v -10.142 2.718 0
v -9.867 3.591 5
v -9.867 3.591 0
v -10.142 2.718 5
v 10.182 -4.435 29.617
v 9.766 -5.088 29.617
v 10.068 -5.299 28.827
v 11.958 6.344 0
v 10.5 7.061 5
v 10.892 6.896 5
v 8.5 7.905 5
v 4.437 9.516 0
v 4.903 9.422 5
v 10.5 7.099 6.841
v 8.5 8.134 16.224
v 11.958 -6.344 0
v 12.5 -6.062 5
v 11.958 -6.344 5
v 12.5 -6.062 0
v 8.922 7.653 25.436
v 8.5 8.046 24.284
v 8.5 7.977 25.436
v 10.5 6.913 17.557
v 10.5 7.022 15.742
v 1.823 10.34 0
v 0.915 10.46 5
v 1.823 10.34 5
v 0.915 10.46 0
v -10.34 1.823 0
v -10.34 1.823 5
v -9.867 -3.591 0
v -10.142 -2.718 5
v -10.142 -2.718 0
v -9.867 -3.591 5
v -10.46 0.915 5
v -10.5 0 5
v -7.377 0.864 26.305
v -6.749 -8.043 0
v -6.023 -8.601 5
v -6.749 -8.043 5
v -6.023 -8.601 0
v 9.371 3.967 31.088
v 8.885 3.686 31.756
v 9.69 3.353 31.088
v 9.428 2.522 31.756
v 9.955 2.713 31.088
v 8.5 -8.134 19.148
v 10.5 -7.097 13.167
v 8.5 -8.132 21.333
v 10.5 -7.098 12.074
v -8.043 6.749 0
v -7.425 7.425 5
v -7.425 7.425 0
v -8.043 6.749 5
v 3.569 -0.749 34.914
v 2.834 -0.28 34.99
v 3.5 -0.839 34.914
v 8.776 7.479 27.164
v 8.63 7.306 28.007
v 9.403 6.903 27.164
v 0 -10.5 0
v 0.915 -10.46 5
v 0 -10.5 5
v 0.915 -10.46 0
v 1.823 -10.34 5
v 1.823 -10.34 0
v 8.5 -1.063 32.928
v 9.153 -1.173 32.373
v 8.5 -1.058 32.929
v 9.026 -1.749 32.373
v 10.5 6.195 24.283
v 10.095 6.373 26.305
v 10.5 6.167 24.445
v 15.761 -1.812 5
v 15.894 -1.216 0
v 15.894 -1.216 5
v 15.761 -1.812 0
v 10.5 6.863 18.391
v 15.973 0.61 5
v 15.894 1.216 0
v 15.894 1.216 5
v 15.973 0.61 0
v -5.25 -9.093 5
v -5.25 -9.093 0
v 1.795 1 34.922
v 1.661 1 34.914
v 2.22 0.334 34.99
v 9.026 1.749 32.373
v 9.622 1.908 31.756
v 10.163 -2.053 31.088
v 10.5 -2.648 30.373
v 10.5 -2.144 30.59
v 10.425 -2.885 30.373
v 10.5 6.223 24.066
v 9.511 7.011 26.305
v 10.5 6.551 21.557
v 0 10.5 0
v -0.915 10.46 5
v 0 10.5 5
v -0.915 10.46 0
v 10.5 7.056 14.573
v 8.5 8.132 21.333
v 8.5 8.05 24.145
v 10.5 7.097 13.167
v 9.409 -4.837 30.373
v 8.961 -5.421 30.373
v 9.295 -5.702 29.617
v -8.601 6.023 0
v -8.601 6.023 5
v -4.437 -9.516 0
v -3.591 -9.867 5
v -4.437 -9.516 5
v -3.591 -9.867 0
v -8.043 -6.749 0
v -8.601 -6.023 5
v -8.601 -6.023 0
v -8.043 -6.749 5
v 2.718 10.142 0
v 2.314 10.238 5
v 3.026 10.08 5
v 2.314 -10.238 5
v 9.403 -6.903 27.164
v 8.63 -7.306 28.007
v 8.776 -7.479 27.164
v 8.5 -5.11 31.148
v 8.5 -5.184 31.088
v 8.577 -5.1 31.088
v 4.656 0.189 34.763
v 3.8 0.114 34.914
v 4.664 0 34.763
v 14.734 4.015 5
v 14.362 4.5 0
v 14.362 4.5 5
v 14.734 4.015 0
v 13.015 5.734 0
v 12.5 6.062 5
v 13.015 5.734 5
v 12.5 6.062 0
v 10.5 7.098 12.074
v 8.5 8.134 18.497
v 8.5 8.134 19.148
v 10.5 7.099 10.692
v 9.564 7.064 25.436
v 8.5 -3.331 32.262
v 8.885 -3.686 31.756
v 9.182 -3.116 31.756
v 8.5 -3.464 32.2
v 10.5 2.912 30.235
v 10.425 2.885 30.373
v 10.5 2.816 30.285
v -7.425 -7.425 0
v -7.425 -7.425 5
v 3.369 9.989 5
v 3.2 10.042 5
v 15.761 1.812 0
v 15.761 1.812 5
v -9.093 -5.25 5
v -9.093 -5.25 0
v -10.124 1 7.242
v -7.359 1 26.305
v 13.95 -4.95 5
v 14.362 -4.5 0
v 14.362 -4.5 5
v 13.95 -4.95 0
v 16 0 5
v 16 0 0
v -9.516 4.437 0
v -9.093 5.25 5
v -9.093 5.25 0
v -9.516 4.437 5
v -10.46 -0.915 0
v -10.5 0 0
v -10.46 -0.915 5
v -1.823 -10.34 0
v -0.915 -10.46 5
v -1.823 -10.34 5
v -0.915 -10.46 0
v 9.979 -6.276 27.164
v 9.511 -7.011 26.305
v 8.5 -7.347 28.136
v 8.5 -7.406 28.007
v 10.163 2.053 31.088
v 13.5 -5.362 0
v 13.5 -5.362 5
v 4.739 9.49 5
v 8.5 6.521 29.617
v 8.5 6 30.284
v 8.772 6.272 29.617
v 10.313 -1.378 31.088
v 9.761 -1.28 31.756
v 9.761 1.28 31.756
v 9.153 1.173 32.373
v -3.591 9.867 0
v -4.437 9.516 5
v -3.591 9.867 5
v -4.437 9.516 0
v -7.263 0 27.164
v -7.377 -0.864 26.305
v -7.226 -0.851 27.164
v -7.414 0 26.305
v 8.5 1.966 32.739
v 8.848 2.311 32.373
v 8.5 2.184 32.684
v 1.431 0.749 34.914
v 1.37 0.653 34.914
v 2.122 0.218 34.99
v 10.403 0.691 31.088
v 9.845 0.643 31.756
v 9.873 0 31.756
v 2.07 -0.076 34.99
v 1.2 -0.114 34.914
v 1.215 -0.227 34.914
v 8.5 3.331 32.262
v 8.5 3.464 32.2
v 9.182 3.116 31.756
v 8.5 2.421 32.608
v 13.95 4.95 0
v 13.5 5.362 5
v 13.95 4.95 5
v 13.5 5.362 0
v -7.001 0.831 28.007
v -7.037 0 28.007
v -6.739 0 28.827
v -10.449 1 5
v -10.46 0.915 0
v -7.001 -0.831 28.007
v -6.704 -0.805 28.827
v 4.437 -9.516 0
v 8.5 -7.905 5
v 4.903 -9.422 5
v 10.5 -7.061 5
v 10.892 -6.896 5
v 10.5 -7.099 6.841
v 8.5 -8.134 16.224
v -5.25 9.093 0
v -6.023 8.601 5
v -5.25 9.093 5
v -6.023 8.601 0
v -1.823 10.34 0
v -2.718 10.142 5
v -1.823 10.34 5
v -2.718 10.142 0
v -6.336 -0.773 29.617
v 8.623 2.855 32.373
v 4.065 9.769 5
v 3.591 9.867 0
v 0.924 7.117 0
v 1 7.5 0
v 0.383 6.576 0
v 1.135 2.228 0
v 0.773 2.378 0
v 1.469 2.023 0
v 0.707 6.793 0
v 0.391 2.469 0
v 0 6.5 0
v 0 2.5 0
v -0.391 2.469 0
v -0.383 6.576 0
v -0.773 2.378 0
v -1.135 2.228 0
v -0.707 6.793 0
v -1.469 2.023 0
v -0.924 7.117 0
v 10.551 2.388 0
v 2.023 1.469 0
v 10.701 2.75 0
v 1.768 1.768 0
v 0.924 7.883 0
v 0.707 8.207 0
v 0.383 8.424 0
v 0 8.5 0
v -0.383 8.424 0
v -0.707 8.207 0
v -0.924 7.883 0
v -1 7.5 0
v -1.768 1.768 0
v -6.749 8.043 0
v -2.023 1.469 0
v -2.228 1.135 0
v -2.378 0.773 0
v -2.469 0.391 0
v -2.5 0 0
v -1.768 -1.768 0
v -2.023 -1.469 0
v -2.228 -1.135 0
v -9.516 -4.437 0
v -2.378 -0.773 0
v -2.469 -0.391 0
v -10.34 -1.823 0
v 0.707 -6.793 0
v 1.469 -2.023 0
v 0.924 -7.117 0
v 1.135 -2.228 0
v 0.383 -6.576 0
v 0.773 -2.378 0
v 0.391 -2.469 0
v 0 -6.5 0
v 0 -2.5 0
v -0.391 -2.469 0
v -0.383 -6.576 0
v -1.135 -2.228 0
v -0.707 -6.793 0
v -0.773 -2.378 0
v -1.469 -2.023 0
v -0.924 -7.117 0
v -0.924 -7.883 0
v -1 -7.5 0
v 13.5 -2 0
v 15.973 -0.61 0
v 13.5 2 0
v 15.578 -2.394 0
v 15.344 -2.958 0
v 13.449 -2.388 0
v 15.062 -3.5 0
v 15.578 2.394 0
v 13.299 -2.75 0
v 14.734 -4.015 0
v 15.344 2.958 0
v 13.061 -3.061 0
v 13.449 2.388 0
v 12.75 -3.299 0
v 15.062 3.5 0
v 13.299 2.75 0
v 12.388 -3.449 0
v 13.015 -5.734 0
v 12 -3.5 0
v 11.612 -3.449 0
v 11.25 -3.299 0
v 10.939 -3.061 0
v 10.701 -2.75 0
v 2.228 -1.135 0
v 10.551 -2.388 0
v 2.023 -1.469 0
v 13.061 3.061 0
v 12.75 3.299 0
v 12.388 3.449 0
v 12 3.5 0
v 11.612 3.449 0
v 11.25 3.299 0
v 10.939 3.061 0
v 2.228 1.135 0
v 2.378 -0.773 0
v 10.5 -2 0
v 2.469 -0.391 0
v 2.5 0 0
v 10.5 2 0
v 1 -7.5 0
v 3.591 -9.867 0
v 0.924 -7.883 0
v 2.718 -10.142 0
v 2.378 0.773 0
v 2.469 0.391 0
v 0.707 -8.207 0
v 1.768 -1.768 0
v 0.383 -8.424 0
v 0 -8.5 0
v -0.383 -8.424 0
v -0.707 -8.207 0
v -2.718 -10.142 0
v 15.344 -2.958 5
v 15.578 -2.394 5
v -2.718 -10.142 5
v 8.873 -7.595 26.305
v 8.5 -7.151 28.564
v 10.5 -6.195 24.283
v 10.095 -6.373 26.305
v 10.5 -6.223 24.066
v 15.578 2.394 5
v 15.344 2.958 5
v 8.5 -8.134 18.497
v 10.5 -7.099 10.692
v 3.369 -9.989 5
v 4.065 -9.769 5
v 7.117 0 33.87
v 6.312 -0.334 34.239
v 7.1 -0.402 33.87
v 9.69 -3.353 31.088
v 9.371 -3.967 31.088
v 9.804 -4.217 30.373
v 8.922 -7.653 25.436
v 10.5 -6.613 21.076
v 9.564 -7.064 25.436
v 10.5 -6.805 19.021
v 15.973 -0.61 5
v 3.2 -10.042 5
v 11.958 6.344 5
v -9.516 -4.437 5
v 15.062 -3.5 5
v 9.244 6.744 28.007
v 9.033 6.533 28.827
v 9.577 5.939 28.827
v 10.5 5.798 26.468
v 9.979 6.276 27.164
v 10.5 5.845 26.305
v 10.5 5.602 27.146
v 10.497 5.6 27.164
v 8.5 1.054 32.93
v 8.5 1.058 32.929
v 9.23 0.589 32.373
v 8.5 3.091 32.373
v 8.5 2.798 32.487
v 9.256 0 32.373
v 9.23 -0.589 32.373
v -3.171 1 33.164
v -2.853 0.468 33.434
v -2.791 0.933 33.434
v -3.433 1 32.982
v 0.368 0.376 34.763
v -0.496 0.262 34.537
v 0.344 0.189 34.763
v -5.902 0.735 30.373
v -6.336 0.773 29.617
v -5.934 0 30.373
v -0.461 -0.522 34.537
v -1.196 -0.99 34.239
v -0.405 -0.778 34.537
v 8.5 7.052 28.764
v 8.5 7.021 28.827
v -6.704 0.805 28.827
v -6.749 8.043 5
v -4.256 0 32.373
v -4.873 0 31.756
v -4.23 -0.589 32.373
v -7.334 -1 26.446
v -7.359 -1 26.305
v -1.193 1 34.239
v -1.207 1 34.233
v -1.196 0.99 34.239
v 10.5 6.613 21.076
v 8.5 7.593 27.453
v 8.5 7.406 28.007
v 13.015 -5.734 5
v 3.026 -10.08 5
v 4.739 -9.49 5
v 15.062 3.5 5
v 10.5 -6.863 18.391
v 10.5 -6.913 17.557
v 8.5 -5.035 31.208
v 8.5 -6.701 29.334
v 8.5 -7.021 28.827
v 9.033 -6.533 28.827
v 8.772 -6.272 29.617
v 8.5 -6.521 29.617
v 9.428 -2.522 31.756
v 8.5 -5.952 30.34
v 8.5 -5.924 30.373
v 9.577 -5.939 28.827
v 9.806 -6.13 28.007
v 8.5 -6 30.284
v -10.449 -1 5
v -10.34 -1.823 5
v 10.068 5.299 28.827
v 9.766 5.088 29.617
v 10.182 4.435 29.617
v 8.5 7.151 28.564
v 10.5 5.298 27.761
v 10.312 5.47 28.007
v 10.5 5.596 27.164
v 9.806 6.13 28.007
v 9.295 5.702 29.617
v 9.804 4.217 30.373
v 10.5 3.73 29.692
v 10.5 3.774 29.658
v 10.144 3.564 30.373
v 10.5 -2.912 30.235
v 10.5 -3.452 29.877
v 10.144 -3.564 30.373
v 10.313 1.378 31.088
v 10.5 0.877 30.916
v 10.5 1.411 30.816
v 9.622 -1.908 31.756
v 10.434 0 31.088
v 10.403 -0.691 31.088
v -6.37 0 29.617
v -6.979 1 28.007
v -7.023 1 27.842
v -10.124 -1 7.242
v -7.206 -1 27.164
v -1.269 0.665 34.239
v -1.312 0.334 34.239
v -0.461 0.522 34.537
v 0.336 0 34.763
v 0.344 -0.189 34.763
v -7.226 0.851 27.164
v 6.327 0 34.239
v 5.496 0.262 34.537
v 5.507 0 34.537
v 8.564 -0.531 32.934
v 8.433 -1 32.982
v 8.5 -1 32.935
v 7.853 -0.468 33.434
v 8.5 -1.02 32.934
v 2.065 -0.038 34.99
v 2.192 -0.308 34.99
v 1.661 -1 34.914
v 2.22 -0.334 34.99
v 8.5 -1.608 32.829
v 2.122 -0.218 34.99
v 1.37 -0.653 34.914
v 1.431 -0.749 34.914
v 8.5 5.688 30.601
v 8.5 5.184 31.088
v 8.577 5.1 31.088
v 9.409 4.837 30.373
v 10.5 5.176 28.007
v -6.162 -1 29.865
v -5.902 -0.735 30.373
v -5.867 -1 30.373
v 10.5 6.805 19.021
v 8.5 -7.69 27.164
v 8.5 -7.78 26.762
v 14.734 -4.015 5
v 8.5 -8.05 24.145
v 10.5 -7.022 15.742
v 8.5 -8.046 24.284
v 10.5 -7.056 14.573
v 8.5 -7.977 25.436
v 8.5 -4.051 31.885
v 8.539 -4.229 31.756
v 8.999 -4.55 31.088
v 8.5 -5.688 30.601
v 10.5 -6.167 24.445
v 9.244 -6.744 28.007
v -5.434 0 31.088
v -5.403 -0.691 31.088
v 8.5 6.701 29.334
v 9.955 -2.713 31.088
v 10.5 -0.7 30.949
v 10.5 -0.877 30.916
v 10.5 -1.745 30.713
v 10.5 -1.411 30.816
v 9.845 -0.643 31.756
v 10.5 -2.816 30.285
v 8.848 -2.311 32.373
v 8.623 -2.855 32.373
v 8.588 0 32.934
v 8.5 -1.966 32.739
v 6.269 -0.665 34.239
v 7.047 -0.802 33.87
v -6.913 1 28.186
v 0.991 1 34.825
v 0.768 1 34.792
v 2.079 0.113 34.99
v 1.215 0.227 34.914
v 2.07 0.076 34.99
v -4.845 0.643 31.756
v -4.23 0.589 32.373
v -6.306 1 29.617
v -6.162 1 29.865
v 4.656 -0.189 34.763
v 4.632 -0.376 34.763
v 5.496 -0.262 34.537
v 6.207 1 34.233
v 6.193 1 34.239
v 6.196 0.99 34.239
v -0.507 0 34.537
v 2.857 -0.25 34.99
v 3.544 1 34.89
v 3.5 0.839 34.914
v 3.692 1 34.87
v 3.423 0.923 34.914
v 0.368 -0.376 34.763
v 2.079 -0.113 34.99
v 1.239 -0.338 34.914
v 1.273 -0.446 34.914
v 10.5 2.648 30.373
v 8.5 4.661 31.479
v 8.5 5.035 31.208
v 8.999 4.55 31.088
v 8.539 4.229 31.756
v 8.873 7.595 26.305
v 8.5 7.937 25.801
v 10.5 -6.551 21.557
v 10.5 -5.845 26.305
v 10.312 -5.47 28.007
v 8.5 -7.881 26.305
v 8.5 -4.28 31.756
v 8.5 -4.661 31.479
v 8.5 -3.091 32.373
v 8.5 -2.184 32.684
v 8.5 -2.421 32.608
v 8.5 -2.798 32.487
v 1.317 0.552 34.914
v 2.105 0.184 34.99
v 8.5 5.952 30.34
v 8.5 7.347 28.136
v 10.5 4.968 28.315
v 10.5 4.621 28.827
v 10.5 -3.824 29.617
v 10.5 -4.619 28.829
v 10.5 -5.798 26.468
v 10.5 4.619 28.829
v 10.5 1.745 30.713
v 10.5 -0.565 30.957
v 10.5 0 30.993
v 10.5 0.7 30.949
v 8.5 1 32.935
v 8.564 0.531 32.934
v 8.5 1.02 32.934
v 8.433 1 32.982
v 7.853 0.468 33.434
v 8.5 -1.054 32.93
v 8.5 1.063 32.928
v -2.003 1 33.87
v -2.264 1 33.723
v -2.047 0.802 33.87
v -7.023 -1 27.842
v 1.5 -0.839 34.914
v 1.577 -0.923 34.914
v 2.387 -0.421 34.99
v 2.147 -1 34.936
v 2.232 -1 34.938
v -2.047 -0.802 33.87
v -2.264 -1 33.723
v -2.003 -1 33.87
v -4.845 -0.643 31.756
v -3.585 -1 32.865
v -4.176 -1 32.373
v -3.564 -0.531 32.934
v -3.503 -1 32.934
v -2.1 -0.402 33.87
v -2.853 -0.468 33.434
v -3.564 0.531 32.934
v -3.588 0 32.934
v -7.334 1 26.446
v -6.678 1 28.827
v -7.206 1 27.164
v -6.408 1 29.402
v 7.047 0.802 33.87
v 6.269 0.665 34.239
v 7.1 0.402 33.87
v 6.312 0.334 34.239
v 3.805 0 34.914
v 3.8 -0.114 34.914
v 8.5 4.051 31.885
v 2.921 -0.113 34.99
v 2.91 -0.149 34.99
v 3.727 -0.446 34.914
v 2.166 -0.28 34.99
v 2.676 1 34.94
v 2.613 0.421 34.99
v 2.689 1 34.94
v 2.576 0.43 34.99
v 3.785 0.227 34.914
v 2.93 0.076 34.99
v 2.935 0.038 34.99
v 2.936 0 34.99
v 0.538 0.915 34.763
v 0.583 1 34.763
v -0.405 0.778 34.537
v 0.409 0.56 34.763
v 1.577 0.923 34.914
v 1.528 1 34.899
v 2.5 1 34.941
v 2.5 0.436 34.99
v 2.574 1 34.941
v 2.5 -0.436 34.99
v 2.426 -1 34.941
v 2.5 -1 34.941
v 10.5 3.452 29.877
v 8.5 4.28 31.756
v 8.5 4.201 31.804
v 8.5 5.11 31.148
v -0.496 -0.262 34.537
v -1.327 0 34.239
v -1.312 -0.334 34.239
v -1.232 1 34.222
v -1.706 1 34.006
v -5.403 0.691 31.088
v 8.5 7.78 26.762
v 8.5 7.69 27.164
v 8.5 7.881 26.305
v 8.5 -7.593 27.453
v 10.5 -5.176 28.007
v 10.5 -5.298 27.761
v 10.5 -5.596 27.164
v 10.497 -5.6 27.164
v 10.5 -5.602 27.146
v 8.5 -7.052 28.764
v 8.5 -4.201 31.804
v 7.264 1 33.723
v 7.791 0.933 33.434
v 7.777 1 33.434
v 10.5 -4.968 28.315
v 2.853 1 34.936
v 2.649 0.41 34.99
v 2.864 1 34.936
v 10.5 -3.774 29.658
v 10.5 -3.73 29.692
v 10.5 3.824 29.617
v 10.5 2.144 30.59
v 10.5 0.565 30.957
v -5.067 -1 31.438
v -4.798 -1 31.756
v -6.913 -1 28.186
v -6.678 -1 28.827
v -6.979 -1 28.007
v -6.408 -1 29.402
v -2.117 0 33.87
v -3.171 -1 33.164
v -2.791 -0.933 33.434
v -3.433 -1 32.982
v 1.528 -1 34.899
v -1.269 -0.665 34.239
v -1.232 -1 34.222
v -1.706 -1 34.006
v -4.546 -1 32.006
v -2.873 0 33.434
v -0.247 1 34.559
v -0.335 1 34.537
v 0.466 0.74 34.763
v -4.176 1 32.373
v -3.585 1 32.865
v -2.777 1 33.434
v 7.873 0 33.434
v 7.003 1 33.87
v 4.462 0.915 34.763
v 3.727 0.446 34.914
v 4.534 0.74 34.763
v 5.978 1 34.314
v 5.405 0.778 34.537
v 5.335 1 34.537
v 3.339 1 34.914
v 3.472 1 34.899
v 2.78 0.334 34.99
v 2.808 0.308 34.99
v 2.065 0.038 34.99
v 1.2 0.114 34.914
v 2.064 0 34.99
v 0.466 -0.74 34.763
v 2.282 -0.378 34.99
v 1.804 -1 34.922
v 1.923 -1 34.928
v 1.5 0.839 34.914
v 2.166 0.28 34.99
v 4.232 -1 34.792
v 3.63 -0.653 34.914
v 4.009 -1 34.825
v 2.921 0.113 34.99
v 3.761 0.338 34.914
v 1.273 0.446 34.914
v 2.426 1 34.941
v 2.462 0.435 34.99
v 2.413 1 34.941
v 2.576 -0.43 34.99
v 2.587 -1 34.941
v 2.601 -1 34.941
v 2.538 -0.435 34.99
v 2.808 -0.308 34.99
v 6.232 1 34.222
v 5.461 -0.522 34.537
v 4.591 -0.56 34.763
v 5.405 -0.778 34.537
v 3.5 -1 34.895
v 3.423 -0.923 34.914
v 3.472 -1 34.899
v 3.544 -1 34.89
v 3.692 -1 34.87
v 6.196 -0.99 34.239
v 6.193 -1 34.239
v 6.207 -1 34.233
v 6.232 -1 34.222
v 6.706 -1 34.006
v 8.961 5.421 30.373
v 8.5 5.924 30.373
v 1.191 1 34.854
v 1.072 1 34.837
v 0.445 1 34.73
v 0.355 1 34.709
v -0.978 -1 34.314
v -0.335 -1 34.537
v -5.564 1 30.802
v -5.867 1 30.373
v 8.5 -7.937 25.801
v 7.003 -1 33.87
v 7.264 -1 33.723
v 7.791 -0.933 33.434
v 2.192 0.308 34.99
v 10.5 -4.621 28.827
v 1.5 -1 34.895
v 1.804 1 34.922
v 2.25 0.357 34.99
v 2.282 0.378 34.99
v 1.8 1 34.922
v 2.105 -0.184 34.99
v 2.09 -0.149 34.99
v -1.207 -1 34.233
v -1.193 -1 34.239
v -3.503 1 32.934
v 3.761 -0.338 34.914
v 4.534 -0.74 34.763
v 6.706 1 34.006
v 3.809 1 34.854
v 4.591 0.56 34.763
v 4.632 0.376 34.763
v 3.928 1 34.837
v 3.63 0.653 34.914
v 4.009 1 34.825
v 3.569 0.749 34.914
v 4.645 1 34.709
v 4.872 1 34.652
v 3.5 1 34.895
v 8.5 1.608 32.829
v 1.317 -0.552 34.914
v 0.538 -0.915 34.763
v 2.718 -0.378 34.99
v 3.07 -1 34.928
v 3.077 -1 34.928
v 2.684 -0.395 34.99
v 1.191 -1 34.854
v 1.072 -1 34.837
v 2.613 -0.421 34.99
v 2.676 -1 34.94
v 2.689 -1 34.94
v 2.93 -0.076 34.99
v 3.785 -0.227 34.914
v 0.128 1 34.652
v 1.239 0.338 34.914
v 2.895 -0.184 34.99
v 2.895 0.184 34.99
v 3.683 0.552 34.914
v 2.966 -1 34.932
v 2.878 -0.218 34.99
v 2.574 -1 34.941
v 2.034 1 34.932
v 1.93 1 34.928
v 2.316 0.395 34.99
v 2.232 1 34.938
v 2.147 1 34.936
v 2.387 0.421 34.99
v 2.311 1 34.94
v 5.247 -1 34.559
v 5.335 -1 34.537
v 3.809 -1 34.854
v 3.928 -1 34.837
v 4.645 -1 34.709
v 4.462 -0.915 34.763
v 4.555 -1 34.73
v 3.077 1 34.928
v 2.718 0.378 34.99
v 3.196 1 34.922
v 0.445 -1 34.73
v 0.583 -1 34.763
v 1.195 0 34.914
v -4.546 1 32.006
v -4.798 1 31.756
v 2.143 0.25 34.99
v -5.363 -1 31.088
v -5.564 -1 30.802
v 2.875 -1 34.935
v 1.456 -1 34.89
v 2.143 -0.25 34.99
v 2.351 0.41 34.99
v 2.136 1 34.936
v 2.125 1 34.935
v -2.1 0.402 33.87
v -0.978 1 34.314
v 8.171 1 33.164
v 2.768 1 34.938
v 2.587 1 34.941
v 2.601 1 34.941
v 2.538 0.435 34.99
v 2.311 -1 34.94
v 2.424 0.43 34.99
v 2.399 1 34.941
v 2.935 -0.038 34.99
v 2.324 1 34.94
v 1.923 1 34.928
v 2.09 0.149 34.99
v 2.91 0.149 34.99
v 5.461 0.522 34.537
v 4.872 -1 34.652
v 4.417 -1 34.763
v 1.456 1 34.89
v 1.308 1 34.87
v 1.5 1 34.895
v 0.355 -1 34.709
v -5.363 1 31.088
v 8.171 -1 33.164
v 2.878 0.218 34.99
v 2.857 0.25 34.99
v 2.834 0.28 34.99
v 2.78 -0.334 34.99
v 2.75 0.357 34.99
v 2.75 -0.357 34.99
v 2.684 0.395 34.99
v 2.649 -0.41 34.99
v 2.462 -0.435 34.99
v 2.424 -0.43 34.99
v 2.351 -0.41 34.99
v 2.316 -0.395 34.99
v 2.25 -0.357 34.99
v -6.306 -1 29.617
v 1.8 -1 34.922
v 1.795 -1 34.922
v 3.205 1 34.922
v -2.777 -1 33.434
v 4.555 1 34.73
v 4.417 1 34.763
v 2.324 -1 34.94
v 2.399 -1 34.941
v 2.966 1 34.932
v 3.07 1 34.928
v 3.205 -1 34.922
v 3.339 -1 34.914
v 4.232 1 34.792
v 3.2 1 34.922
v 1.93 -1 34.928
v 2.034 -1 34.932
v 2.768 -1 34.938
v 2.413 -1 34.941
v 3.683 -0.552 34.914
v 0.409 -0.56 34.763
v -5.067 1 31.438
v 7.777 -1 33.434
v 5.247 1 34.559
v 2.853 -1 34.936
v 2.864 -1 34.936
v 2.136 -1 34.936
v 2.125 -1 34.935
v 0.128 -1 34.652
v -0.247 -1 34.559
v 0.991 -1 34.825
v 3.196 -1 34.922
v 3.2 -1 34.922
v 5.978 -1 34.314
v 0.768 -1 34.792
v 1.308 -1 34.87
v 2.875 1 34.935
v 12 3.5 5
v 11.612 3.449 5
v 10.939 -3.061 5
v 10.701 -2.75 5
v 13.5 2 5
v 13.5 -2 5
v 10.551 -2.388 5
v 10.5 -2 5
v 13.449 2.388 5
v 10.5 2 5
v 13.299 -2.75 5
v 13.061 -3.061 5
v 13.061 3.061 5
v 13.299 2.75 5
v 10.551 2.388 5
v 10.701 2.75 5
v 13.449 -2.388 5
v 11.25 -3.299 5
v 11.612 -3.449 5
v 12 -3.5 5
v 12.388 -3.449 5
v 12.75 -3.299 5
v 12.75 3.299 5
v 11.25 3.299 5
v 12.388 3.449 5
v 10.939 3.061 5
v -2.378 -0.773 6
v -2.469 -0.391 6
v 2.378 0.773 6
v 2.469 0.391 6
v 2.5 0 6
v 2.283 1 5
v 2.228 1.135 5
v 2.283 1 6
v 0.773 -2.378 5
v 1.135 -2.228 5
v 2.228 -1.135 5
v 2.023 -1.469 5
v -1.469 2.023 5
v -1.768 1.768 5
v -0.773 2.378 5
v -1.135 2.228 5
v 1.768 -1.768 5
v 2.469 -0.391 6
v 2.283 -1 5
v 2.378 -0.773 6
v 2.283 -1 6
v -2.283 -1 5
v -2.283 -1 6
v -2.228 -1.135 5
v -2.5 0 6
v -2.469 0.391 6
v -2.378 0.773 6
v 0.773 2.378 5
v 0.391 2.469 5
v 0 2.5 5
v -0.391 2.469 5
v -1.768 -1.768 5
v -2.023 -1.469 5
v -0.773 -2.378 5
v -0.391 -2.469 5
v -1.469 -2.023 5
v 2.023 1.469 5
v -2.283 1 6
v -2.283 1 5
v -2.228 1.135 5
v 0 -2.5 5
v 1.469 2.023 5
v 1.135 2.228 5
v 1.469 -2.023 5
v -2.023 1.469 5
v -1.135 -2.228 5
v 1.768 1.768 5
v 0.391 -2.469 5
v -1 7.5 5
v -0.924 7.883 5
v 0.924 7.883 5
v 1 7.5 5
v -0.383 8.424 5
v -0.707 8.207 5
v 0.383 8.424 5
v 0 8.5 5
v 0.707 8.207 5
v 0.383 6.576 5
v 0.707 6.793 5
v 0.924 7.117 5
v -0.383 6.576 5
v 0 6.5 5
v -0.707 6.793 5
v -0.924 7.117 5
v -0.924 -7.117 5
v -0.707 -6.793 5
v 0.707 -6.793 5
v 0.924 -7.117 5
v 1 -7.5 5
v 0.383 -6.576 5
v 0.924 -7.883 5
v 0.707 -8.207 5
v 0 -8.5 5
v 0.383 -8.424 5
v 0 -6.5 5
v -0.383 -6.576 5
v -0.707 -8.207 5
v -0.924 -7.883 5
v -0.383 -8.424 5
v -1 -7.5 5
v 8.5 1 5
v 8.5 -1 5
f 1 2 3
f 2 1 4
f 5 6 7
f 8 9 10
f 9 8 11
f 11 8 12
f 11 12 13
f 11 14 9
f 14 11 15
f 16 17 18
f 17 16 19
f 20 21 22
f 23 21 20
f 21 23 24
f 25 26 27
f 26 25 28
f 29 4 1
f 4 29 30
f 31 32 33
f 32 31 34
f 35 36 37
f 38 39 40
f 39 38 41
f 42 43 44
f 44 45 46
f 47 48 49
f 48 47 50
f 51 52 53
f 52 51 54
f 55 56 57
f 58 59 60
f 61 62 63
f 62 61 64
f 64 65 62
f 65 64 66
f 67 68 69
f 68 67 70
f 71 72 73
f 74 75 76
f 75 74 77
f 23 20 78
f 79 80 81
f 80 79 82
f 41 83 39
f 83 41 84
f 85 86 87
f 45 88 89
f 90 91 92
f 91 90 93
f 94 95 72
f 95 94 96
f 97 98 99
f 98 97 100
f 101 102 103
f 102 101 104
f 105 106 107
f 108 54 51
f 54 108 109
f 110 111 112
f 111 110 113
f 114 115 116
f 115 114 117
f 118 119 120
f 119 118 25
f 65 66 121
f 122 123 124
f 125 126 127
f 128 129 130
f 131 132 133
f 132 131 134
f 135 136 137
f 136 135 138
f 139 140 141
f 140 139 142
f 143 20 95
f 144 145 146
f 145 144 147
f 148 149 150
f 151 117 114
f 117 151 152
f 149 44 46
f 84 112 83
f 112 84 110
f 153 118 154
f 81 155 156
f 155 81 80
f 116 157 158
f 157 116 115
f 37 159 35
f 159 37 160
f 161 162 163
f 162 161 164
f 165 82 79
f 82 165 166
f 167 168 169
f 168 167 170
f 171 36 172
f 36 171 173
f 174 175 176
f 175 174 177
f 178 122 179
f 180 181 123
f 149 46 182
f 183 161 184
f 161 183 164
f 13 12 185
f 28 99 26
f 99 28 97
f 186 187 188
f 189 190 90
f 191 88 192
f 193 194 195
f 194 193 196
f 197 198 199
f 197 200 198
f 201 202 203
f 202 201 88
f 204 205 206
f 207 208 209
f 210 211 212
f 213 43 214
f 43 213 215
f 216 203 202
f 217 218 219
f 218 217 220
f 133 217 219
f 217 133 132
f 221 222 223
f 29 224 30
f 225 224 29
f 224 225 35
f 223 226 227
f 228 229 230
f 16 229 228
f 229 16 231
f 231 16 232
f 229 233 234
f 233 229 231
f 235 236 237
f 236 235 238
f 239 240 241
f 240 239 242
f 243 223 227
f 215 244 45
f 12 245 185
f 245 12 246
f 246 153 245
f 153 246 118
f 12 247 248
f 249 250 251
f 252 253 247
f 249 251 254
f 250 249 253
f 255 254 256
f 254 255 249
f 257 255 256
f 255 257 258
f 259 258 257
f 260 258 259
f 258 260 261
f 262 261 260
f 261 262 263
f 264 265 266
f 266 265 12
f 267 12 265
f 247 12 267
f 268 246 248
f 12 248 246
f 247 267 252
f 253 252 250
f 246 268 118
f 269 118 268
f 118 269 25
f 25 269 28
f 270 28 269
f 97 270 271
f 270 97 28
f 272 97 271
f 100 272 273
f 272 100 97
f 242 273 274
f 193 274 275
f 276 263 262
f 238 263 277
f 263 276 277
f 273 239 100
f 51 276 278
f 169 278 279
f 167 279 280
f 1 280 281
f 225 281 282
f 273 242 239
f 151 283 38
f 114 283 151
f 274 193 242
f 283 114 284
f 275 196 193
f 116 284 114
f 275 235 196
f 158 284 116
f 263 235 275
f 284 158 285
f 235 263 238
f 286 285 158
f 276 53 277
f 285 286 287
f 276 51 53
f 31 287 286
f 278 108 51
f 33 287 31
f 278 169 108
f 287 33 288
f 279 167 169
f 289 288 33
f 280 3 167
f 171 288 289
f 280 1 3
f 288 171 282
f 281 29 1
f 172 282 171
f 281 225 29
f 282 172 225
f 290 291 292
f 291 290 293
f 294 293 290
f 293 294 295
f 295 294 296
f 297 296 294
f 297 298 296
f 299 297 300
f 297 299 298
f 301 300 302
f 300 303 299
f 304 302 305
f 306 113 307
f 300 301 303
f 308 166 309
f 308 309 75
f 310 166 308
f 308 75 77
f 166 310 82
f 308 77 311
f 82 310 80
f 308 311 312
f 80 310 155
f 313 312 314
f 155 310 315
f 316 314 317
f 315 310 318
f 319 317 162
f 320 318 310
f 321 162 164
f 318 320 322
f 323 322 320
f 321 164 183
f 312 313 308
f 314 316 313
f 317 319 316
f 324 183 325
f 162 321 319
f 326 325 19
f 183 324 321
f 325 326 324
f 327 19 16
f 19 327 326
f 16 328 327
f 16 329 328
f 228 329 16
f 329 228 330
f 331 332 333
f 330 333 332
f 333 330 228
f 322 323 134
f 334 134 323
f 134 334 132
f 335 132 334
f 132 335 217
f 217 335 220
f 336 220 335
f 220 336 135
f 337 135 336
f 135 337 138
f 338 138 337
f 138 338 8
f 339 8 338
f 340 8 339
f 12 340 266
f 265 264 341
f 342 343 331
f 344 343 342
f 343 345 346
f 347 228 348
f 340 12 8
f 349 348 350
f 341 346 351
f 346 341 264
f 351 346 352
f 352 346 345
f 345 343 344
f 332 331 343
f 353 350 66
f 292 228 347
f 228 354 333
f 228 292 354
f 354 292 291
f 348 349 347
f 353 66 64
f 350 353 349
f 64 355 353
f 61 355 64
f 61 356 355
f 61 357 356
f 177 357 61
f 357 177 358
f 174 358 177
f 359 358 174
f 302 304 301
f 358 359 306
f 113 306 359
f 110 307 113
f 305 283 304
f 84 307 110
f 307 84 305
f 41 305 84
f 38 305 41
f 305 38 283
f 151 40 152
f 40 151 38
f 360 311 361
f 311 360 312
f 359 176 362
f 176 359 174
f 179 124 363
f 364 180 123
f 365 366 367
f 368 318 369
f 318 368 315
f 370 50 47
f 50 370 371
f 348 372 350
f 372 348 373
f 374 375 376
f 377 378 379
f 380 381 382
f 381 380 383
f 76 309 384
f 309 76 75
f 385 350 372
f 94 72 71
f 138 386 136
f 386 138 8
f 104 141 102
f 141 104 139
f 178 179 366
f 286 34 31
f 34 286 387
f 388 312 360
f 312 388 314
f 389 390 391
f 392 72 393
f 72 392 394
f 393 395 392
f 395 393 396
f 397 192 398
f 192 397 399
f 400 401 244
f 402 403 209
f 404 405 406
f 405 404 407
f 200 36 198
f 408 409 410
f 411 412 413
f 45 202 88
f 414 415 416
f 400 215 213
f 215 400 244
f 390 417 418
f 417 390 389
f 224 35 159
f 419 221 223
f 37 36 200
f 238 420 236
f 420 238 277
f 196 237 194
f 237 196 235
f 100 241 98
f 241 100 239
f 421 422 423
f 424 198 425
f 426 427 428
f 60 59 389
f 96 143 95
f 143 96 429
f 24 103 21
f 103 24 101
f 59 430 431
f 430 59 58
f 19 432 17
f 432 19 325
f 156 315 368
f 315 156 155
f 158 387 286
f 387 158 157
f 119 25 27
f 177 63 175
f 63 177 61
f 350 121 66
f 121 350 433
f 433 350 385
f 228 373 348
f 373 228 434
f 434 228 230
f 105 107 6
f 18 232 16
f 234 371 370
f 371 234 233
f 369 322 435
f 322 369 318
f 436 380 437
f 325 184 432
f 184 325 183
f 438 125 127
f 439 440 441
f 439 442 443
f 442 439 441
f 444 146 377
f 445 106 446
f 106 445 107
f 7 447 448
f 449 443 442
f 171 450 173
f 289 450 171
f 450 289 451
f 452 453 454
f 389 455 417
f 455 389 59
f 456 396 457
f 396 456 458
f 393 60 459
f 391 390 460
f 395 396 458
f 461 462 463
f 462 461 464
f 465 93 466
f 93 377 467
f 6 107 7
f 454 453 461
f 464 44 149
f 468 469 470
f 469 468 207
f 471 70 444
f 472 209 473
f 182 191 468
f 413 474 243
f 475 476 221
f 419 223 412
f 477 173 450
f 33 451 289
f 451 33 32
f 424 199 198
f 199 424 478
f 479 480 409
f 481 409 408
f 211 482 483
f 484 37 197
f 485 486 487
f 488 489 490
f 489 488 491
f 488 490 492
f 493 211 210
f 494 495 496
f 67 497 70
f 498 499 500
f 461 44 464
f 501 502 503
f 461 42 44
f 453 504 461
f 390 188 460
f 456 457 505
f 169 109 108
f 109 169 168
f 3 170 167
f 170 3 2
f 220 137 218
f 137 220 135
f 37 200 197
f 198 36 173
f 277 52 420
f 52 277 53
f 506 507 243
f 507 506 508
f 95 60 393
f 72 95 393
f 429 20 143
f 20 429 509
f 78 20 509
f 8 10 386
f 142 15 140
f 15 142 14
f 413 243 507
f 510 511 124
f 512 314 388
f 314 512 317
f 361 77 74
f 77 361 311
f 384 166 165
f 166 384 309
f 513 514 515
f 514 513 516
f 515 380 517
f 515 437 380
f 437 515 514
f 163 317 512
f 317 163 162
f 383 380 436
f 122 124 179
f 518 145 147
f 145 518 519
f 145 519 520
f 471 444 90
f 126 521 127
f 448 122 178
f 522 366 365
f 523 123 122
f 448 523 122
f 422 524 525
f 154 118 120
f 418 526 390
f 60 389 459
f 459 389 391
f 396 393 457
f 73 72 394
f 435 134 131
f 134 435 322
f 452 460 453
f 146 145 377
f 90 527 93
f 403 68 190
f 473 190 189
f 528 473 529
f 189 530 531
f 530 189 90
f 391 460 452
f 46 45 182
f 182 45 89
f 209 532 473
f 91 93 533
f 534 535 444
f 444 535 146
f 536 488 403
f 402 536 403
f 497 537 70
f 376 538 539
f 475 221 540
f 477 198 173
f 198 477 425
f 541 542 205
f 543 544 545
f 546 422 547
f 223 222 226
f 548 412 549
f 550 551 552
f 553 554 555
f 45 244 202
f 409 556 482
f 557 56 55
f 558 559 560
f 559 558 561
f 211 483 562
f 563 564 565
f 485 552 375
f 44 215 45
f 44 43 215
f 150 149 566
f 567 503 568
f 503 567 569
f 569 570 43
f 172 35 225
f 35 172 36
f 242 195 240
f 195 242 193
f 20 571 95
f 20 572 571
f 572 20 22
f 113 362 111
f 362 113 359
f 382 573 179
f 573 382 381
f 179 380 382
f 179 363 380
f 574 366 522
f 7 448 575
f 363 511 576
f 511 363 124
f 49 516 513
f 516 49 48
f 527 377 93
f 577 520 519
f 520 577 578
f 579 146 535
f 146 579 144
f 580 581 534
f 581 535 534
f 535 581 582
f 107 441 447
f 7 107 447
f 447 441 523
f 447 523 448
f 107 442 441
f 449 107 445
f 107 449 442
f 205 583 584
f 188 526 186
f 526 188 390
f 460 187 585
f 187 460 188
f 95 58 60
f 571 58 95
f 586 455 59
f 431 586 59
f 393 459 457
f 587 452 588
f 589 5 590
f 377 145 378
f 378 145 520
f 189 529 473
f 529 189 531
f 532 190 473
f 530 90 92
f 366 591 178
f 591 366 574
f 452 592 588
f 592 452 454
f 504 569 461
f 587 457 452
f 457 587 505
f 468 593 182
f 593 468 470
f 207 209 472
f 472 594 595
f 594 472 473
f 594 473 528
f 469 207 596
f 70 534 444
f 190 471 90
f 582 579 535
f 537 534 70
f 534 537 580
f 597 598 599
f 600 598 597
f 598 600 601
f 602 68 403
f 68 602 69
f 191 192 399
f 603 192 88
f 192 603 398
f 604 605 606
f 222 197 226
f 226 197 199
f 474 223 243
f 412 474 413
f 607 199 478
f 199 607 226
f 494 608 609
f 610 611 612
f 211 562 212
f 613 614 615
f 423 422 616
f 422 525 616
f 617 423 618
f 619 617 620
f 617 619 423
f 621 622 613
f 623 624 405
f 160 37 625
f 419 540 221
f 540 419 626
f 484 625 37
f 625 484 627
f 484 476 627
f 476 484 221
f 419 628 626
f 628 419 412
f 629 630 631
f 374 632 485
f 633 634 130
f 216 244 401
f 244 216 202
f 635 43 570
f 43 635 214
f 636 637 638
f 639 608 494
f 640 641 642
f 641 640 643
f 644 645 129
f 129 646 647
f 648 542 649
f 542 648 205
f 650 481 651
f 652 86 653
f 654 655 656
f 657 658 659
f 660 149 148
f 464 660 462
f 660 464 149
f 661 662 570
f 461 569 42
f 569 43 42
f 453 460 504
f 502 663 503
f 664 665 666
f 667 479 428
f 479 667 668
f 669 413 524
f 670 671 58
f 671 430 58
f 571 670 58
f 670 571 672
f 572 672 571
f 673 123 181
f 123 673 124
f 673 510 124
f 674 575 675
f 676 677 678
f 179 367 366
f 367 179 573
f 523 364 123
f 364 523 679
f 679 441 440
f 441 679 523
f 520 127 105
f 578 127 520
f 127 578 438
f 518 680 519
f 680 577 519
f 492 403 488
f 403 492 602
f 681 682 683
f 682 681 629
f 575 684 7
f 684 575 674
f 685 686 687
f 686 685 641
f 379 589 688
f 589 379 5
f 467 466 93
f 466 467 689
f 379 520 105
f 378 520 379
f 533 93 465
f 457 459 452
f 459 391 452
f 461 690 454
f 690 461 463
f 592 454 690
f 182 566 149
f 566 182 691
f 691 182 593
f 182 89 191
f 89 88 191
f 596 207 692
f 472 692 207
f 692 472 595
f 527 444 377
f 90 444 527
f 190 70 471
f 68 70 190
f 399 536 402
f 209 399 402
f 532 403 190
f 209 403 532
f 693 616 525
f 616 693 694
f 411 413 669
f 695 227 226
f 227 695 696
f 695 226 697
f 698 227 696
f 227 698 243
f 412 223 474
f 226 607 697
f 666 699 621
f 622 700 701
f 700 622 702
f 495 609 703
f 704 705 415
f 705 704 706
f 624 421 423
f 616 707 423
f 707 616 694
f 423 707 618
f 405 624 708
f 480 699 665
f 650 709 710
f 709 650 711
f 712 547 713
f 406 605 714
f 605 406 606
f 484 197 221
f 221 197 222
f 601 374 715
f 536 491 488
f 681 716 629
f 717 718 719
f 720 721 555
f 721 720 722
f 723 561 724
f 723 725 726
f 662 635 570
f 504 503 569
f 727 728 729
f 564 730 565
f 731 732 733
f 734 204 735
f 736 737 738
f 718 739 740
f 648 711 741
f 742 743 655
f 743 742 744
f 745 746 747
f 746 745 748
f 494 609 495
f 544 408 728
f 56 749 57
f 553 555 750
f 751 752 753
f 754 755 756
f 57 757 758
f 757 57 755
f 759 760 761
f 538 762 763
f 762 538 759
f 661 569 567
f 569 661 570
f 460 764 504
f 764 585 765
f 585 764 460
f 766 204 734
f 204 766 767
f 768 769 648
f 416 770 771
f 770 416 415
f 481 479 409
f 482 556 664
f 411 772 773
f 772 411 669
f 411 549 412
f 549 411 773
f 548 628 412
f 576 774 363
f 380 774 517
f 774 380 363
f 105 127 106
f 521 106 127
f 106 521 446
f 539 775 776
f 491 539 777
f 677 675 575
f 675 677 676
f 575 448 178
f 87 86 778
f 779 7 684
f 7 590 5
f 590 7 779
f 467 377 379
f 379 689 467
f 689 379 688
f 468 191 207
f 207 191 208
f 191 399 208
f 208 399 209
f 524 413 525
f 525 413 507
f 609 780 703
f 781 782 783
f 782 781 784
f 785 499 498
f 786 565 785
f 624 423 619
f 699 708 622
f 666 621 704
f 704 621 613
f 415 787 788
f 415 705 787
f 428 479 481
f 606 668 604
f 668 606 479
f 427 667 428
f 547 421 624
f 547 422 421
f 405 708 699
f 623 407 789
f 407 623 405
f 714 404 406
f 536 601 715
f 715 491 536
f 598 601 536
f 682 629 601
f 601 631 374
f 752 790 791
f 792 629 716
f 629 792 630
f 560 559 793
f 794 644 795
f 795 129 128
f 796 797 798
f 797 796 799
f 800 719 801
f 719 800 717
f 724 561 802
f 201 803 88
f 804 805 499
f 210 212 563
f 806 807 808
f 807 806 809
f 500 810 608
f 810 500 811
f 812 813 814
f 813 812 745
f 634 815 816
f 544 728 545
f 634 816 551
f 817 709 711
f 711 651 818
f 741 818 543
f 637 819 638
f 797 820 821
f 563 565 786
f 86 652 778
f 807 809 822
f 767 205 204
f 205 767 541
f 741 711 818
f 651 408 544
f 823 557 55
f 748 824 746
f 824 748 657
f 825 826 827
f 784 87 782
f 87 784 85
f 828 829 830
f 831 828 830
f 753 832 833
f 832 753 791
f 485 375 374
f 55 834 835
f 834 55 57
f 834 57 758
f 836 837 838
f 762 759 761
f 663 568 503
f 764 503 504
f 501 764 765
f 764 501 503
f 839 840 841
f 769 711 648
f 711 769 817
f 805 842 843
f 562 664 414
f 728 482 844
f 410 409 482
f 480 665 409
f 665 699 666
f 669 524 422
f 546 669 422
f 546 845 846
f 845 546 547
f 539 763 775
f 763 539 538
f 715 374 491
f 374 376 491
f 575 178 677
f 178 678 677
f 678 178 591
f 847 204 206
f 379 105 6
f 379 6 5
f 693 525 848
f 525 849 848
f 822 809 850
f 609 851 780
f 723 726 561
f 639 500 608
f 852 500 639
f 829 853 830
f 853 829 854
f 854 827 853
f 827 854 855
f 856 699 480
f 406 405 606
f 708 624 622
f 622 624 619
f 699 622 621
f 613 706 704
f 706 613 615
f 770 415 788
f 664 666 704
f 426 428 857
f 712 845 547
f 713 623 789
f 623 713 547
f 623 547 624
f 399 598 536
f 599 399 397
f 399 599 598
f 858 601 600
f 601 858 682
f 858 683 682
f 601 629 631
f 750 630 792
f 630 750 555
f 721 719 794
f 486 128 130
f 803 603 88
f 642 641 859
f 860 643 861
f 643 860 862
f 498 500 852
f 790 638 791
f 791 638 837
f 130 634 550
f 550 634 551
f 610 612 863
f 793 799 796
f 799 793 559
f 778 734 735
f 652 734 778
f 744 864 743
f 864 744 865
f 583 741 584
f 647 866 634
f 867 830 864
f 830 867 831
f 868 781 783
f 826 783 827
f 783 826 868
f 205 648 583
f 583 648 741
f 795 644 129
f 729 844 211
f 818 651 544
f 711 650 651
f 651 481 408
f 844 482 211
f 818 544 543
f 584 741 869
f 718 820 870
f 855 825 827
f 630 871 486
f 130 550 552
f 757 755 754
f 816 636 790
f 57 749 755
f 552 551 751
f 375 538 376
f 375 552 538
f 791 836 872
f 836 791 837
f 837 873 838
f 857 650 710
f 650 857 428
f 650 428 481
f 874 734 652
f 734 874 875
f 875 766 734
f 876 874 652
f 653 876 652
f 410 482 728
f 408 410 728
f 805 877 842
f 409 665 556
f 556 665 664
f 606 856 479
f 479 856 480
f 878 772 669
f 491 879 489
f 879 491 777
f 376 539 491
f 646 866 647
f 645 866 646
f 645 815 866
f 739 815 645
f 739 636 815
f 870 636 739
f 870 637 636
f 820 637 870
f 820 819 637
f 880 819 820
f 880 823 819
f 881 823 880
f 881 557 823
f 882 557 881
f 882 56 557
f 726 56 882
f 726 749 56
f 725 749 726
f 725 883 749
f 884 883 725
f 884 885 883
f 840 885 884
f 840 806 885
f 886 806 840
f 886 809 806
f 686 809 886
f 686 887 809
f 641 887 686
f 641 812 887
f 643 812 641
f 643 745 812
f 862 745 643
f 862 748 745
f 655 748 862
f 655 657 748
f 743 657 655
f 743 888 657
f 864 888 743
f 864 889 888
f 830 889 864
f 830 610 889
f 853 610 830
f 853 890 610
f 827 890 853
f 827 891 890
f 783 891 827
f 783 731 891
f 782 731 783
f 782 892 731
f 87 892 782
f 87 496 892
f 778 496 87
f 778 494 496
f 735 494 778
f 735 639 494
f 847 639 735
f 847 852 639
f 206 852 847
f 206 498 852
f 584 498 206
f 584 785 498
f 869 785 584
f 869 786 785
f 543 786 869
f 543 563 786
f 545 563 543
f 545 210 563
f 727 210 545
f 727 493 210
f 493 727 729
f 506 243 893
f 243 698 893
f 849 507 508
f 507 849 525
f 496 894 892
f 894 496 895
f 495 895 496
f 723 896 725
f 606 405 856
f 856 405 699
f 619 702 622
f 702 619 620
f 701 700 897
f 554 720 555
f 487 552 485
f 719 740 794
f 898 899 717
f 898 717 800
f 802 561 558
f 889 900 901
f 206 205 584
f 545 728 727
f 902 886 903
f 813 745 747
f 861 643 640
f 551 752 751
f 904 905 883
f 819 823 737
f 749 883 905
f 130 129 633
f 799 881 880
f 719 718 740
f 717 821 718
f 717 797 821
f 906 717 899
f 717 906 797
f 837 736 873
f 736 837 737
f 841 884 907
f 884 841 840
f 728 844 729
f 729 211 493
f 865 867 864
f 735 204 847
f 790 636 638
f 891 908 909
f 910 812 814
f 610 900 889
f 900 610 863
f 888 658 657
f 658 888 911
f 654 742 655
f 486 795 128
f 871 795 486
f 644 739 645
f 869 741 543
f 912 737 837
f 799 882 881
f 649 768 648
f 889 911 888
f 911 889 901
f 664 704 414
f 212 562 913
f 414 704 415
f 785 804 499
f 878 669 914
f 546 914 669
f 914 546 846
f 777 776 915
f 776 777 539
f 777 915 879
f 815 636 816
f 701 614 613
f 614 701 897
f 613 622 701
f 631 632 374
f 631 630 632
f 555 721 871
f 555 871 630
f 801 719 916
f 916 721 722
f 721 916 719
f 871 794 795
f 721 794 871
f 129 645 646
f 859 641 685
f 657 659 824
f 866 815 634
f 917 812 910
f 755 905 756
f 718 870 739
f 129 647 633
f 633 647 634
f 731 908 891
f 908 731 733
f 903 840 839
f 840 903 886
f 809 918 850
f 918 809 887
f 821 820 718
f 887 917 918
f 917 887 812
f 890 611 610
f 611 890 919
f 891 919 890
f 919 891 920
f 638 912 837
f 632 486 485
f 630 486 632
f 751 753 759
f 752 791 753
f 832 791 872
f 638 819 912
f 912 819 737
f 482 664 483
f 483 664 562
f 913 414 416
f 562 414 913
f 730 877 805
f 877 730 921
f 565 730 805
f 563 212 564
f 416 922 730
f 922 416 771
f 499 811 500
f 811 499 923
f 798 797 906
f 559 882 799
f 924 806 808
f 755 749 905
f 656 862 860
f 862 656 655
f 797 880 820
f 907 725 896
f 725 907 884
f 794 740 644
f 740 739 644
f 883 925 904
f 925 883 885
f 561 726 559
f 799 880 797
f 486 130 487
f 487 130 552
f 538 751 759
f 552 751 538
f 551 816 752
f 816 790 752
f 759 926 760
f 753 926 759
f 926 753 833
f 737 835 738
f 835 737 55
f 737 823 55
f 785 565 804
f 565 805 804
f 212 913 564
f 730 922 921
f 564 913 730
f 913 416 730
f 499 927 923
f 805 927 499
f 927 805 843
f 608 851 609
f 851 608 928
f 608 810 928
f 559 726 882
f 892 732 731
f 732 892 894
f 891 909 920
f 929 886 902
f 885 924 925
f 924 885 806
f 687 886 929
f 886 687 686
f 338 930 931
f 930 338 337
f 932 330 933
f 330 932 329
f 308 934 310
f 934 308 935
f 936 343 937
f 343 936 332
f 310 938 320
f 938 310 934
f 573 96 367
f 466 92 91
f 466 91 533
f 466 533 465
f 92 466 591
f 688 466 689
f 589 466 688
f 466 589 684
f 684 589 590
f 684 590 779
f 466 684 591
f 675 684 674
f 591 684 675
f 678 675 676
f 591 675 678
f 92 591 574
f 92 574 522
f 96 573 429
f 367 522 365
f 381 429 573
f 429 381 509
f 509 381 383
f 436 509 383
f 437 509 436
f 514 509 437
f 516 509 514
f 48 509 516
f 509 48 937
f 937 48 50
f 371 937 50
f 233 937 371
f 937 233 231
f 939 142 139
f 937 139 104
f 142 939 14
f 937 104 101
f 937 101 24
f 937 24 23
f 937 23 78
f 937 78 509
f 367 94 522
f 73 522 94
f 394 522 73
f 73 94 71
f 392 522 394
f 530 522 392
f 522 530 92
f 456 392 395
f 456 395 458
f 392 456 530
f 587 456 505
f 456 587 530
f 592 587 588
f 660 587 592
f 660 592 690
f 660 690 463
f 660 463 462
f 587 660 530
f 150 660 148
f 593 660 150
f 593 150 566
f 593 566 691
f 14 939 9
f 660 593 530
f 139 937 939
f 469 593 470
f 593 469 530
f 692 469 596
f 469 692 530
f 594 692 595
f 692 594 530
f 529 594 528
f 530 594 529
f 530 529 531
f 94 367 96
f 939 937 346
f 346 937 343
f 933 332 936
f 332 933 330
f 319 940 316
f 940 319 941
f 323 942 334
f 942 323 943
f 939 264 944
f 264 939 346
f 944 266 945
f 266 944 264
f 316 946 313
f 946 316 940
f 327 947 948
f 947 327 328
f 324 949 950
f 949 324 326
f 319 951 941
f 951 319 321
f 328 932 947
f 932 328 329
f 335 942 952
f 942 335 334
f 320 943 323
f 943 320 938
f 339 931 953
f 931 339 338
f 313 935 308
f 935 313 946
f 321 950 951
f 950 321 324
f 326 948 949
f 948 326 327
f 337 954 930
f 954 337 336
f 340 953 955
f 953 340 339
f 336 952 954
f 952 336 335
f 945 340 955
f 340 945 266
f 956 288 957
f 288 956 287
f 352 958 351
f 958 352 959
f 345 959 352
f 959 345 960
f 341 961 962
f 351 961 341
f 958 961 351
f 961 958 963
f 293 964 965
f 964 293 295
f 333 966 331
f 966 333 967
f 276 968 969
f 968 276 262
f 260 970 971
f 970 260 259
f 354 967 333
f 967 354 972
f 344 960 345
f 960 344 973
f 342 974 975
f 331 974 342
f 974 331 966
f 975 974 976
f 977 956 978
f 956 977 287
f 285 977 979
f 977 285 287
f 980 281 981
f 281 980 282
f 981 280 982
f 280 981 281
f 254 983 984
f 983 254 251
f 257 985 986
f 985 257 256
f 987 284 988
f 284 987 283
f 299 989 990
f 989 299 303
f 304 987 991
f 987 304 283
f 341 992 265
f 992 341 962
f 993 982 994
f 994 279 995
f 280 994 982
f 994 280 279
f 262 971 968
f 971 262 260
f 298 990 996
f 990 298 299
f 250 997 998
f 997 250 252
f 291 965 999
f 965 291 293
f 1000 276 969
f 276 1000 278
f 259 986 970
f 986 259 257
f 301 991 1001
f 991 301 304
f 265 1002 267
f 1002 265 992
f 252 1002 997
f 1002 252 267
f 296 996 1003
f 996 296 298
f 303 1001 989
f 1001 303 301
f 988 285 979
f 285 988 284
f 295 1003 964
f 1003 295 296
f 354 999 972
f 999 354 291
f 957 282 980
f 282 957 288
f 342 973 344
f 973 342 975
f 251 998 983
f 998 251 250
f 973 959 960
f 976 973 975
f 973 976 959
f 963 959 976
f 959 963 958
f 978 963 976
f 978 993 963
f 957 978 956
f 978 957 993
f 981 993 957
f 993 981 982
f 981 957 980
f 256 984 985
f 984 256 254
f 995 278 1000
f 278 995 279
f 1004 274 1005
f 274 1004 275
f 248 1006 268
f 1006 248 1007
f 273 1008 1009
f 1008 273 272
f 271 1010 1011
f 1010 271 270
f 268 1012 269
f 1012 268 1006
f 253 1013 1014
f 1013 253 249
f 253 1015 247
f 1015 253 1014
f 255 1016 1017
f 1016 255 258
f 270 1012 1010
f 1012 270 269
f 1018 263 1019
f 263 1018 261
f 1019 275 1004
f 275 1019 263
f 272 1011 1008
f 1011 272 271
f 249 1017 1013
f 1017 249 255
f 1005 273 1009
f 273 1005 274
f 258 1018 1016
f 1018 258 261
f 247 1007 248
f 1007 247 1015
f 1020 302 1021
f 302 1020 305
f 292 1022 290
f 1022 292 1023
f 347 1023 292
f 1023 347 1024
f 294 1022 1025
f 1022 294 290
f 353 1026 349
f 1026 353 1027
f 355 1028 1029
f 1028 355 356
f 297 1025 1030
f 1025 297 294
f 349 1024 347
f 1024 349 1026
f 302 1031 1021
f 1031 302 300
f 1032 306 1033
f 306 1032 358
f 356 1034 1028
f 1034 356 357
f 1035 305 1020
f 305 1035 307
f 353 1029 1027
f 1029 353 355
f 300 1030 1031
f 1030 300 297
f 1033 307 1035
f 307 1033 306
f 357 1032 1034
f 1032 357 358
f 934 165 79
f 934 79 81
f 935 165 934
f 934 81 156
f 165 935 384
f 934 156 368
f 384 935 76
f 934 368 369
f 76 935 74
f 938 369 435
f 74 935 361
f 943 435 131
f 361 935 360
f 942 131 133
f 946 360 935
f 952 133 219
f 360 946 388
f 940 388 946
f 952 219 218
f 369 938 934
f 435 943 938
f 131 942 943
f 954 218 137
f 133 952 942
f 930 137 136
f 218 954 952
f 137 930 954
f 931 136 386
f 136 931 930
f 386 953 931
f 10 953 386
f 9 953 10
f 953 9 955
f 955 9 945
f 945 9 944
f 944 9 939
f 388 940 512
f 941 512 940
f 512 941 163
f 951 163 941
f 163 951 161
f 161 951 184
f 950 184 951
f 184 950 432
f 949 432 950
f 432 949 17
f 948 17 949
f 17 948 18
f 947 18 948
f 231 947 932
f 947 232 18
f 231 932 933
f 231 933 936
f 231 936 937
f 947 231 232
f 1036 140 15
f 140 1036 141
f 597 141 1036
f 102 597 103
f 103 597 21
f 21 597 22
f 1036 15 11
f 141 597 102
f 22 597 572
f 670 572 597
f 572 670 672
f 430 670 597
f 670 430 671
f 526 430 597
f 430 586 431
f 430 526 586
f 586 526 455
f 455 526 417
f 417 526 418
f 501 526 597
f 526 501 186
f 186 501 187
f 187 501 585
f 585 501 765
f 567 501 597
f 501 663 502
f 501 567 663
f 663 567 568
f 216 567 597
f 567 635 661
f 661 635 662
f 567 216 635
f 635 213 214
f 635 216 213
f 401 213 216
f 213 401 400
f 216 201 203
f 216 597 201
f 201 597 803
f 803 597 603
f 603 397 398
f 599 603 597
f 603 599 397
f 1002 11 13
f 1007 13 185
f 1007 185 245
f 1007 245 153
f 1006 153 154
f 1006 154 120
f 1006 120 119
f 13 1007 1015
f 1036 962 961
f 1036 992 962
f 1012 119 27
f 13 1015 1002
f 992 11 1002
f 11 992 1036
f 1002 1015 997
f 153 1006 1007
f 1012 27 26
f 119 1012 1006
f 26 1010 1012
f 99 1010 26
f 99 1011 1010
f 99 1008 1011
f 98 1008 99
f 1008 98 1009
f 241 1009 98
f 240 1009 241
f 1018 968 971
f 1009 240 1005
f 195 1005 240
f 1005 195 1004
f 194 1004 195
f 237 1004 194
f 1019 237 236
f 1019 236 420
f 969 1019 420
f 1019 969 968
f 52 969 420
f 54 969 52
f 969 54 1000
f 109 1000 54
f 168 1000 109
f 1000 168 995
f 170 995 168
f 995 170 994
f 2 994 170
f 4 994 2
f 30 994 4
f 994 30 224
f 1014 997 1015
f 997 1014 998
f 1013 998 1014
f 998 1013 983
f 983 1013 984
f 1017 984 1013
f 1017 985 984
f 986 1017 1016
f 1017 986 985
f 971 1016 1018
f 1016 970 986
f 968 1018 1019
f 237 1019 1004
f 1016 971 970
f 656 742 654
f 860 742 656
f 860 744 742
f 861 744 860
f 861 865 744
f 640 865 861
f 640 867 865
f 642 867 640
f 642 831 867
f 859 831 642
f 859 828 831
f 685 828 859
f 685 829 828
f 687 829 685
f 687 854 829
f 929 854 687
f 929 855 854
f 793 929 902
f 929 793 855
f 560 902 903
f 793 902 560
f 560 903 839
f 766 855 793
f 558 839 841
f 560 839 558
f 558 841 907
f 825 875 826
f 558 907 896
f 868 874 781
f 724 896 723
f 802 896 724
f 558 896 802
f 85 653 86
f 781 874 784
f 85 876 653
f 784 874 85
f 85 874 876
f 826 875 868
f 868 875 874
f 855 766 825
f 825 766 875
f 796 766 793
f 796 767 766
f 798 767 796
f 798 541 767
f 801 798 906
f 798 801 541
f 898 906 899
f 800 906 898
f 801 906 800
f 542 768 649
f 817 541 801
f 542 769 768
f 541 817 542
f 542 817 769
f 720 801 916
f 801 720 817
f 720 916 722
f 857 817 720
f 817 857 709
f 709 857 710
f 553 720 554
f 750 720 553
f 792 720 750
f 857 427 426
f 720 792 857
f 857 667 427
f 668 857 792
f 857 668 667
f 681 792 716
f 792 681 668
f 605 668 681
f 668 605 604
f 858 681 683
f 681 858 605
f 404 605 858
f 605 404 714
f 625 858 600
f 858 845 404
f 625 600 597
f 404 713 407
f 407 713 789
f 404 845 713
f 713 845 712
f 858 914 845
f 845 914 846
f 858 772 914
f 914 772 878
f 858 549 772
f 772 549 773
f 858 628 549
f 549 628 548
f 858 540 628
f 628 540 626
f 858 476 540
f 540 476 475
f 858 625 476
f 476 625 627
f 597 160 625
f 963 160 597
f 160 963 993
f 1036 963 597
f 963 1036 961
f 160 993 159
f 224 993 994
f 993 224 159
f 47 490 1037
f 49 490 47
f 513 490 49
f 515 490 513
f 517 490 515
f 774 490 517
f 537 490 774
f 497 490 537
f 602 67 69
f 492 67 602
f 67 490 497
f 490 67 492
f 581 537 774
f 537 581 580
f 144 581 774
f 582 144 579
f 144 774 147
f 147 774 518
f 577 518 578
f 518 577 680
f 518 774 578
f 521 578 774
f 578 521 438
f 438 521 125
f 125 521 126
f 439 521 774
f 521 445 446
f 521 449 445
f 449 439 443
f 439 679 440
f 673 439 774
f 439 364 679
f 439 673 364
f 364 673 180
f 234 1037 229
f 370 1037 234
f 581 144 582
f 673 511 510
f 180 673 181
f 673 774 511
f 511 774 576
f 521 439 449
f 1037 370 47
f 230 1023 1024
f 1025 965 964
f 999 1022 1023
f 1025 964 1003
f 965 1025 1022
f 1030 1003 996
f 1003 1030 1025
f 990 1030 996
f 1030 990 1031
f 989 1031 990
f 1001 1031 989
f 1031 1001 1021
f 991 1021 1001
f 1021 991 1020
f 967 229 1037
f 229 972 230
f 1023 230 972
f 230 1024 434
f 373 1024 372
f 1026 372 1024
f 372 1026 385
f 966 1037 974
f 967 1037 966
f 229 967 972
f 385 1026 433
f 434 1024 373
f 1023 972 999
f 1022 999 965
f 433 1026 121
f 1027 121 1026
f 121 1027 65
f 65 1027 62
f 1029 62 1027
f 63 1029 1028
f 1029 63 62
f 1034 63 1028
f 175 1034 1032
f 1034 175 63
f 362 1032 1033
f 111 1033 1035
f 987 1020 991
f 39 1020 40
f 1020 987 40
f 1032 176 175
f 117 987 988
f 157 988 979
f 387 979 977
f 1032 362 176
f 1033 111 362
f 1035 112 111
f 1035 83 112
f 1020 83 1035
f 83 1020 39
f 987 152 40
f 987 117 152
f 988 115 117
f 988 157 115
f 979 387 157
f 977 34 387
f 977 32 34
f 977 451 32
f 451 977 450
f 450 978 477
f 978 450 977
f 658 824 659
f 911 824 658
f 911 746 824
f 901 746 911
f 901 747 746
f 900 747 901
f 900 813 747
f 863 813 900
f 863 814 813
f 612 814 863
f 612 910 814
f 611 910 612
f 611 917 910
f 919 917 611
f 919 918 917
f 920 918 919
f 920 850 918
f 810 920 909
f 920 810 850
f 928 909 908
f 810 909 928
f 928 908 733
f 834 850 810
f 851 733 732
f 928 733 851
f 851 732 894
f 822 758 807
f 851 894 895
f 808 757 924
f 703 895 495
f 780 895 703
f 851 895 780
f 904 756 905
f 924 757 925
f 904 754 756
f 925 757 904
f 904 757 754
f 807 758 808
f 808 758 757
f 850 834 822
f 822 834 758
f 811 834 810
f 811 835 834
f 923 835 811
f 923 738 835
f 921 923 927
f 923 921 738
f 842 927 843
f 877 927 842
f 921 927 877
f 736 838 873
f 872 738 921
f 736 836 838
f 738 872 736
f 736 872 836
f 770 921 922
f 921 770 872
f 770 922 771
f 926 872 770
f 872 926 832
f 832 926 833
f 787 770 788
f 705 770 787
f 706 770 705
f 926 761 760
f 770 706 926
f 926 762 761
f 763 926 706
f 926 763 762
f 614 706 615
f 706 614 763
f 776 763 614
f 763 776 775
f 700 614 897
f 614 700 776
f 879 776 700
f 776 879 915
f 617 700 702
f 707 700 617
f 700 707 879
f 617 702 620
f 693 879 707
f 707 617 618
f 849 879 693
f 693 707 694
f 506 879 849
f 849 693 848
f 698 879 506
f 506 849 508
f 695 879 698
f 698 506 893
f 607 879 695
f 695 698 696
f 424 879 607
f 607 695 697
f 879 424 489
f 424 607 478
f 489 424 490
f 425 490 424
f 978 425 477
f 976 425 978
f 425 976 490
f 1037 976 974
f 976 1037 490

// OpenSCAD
//$fn=60;
$fa=5;
$fs=.4;

hole_cut_height = 20;
main_part_height = 5;

difference() {
    hull(){
        cylinder(d=21,h=main_part_height);
        translate([9,0,0]) cylinder(d=14,h=main_part_height);
        translate([2.5,0,25]) sphere(d=20);
    }

    translate([12,0,-5]) {
        hull() { //cable hole
            translate([0,2,0]) cylinder(d=3,h=hole_cut_height);
            translate([0,-2,0]) cylinder(d=3,h=hole_cut_height);
        }
    }
    
    translate([0,0,-5]) cylinder(d=5,h=11); //motor shaft hole
    translate([0,7.5,-5]) cylinder(d=2,h=hole_cut_height); //motor mount hole
    translate([0,-7.5,-5]) cylinder(d=2,h=hole_cut_height); //motor mount hole
    
    translate([10.5,-15,5]) cube([30,30,50]); //bottom cut
    translate([-6.5,16,35]) cube([30,30,60],center=true); //side cut
    translate([-6.5,-16,35]) cube([30,30,60],center=true); //side cut
    
}
